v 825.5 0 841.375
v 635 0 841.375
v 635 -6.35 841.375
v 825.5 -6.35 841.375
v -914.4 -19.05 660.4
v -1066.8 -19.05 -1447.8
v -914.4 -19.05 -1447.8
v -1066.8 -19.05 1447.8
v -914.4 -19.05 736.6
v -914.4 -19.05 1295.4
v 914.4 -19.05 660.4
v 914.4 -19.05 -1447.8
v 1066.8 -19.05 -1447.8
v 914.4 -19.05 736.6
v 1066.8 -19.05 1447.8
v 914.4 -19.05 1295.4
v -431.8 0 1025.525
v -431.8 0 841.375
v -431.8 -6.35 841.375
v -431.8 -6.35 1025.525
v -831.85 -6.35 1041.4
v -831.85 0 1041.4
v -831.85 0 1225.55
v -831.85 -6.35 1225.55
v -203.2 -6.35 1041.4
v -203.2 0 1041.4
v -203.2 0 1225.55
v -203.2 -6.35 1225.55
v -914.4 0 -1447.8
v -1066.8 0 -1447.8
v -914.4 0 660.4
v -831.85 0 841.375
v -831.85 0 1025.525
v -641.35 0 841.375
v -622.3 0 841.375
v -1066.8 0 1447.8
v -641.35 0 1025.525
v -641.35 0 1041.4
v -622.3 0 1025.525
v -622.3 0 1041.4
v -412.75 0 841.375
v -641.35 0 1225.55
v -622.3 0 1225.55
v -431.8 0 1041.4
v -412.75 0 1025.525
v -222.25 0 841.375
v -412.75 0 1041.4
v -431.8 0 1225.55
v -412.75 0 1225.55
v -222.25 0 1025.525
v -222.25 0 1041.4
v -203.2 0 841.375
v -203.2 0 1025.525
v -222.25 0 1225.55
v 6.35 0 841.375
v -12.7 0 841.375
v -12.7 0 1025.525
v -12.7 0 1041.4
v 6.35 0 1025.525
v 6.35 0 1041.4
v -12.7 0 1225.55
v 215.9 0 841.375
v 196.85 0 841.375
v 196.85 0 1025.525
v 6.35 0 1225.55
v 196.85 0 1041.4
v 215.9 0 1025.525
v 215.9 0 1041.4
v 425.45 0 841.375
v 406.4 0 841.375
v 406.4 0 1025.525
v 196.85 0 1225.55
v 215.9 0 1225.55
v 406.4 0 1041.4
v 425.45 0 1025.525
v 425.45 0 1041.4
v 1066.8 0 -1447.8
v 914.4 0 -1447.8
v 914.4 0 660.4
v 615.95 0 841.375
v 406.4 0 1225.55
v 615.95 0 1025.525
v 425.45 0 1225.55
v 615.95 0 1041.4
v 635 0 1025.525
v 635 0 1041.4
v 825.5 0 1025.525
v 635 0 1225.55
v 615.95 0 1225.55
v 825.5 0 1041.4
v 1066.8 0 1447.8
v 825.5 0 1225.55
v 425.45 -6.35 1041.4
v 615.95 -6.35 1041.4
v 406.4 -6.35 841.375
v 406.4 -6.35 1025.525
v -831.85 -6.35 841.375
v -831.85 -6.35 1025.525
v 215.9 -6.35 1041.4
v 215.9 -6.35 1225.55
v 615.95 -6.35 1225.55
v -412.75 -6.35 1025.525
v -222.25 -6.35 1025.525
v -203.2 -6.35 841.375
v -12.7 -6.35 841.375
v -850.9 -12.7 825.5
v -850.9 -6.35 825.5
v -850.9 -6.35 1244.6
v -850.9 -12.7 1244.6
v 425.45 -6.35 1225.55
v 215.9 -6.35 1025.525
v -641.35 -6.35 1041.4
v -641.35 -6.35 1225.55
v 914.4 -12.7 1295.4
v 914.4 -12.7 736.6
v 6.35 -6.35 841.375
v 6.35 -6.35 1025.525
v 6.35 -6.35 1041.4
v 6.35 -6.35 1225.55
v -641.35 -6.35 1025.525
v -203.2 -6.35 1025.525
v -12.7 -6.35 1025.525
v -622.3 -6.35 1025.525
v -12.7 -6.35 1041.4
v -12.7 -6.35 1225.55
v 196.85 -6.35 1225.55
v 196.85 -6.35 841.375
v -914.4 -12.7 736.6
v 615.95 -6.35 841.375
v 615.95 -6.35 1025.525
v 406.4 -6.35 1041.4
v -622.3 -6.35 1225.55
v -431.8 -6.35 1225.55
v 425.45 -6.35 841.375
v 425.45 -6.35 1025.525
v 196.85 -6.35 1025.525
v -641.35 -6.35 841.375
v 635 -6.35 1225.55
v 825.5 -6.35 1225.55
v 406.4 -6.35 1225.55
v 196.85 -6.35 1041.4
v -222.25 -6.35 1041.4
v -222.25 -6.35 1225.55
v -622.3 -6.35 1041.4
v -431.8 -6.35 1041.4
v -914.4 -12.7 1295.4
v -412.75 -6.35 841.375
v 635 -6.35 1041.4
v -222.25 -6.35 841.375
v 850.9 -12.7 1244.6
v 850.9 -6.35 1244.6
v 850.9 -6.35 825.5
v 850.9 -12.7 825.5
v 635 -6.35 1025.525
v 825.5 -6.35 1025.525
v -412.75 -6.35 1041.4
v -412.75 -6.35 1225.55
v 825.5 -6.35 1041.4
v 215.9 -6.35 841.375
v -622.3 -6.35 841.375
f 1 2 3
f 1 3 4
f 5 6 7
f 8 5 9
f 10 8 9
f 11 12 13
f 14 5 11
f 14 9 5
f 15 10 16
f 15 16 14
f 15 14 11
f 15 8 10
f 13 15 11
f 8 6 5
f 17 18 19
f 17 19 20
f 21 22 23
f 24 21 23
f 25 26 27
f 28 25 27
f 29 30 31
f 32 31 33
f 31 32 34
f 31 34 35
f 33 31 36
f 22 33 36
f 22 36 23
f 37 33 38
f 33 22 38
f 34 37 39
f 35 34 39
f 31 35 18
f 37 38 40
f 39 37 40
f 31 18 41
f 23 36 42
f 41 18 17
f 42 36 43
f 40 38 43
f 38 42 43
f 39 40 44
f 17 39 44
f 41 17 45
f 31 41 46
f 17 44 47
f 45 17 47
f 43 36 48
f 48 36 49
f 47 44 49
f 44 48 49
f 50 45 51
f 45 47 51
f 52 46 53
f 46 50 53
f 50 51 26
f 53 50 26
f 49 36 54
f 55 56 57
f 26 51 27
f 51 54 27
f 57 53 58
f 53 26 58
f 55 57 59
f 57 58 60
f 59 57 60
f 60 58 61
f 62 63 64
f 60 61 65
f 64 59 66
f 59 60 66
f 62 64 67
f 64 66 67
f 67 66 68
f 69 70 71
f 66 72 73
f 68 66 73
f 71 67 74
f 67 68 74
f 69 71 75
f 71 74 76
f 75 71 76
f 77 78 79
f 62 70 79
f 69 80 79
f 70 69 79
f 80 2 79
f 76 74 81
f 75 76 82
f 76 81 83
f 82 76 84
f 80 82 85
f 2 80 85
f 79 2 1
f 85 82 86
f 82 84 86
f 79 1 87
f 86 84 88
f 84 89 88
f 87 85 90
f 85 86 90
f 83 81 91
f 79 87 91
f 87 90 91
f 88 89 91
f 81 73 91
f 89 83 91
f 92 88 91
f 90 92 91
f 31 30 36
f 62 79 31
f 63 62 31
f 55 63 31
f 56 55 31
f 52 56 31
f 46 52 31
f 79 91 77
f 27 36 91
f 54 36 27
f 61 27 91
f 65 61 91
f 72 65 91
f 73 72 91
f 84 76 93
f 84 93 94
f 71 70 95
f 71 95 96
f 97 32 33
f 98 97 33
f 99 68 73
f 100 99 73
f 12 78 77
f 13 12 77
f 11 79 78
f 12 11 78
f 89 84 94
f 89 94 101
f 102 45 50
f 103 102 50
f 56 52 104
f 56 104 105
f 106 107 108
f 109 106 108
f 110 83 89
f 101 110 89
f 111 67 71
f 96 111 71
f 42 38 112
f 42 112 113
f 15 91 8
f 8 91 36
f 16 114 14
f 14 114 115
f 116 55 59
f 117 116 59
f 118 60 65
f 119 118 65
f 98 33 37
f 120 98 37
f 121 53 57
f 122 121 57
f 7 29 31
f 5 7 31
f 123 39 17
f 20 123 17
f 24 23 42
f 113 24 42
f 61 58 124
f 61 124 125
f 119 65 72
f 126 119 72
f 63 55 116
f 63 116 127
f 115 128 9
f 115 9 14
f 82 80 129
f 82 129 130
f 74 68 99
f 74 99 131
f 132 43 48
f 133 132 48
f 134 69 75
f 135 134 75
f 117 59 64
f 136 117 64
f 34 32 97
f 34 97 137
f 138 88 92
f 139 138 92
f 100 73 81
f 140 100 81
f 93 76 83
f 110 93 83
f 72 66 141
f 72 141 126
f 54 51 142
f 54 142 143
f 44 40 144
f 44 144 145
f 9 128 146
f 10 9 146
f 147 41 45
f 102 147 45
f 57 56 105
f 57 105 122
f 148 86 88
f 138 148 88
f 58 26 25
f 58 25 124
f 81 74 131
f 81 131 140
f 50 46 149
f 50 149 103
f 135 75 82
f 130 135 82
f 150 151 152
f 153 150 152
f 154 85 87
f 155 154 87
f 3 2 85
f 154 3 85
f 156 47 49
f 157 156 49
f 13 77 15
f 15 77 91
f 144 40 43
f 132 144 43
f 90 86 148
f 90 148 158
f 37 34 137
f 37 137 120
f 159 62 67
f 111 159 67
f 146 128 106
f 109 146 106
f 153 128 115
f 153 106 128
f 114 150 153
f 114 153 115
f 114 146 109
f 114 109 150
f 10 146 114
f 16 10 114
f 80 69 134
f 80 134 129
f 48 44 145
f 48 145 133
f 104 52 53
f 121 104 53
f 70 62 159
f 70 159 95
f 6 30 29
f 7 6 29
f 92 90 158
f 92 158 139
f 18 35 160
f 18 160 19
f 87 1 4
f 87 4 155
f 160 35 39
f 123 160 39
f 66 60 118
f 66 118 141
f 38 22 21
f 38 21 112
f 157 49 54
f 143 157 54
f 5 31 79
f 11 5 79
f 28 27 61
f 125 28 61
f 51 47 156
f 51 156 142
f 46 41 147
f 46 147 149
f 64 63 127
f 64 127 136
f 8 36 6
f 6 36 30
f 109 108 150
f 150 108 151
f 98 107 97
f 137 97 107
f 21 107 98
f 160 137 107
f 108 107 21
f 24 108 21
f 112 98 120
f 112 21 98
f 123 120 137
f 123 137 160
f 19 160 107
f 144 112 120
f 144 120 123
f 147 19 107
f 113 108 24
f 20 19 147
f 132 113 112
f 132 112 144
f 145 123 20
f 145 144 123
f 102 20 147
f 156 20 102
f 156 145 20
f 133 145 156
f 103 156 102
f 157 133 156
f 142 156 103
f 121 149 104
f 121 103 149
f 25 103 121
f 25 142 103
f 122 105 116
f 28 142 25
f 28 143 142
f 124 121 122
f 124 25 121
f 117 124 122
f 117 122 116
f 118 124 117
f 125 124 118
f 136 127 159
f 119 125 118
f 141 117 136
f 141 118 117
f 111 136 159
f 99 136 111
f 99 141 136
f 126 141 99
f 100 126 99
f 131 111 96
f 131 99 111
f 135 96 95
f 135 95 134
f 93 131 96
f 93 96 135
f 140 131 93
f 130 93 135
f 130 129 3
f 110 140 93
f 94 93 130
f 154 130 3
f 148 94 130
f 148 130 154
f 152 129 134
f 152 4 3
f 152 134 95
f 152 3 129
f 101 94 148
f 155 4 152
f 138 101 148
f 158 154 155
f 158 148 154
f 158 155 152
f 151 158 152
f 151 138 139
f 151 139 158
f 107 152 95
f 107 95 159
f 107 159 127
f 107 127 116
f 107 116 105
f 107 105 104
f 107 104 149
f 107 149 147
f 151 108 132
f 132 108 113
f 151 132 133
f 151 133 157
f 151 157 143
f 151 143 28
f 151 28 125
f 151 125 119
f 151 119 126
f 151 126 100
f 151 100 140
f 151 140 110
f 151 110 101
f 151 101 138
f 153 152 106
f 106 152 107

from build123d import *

# Parameters (mm, degrees)
F0_W     = 152.4
F0_H     = 152.4
F0_W_2   = 1828.8
F0_H_2   = 76.2
F1_DEPTH = 19.05
F0_H_3   = 558.8
F2_DEPTH = 12.7
F0_W_3   = 190.5
F0_H_4   = 184.15
F3_DEPTH = 6.35


with BuildPart() as f1:
    # F0 (on Front) → F1 (new body)
    with BuildSketch(Plane.XZ):
        Polygon((-914.4, 1295.4), (-1066.8, 1295.4), (-1066.8, -1447.8), (-914.4, -1447.8), (-914.4, 660.4), (-914.4, 736.6), align=None)
        with Locations((-990.6, 1371.6)):
            Rectangle(F0_W, F0_H)
        with Locations((0, 1371.6)):
            Rectangle(F0_W_2, F0_H)
        with Locations((990.6, 1371.6)):
            Rectangle(F0_W, F0_H)
        Polygon((1066.8, 1295.4), (914.4, 1295.4), (914.4, 736.6), (914.4, 660.4), (914.4, -1447.8), (1066.8, -1447.8), align=None)
        with Locations((0, 698.5)):
            Rectangle(F0_W_2, F0_H_2)
    extrude(amount=F1_DEPTH)

    # F0 (on Front) → F2 (join)
    with BuildSketch(Plane.XZ):
        with Locations((0, 1016)):
            Rectangle(F0_W_2, F0_H_3)
        Polygon((-850.9, 1225.55), (-850.9, 1244.6), (-831.85, 1244.6), (-641.35, 1244.6), (-622.3, 1244.6), (850.9, 1244.6), (850.9, 1225.55), (850.9, 1041.4), (850.9, 1025.525), (850.9, 841.375), (850.9, 825.5), (-622.3, 825.5), (-641.35, 825.5), (-831.85, 825.5), (-850.9, 825.5), (-850.9, 841.375), (-850.9, 1025.525), (-850.9, 1041.4), align=None, mode=Mode.SUBTRACT)
    extrude(amount=F2_DEPTH)

    # F0 (on Front) → F3 (join)
    with BuildSketch(Plane.XZ):
        Polygon((-831.85, 1244.6), (-850.9, 1244.6), (-850.9, 1225.55), (-850.9, 1041.4), (-850.9, 1025.525), (-850.9, 841.375), (-850.9, 825.5), (-831.85, 825.5), (-641.35, 825.5), (-622.3, 825.5), (850.9, 825.5), (850.9, 841.375), (850.9, 1025.525), (850.9, 1041.4), (850.9, 1225.55), (850.9, 1244.6), (-622.3, 1244.6), (-641.35, 1244.6), align=None)
        with Locations((-736.6, 933.45)):
            Rectangle(F0_W_3, F0_H_4, mode=Mode.SUBTRACT)
        with Locations((-736.6, 1133.475)):
            Rectangle(F0_W_3, F0_H_4, mode=Mode.SUBTRACT)
        with Locations((-527.05, 933.45)):
            Rectangle(F0_W_3, F0_H_4, mode=Mode.SUBTRACT)
        with Locations((-317.5, 933.45)):
            Rectangle(F0_W_3, F0_H_4, mode=Mode.SUBTRACT)
        with Locations((-107.95, 933.45)):
            Rectangle(F0_W_3, F0_H_4, mode=Mode.SUBTRACT)
        with Locations((-527.05, 1133.475)):
            Rectangle(F0_W_3, F0_H_4, mode=Mode.SUBTRACT)
        with Locations((-317.5, 1133.475)):
            Rectangle(F0_W_3, F0_H_4, mode=Mode.SUBTRACT)
        with Locations((-107.95, 1133.475)):
            Rectangle(F0_W_3, F0_H_4, mode=Mode.SUBTRACT)
        with Locations((101.6, 933.45)):
            Rectangle(F0_W_3, F0_H_4, mode=Mode.SUBTRACT)
        with Locations((311.15, 933.45)):
            Rectangle(F0_W_3, F0_H_4, mode=Mode.SUBTRACT)
        with Locations((520.7, 933.45)):
            Rectangle(F0_W_3, F0_H_4, mode=Mode.SUBTRACT)
        with Locations((101.6, 1133.475)):
            Rectangle(F0_W_3, F0_H_4, mode=Mode.SUBTRACT)
        with Locations((311.15, 1133.475)):
            Rectangle(F0_W_3, F0_H_4, mode=Mode.SUBTRACT)
        with Locations((520.7, 1133.475)):
            Rectangle(F0_W_3, F0_H_4, mode=Mode.SUBTRACT)
        with Locations((730.25, 933.45)):
            Rectangle(F0_W_3, F0_H_4, mode=Mode.SUBTRACT)
        with Locations((730.25, 1133.475)):
            Rectangle(F0_W_3, F0_H_4, mode=Mode.SUBTRACT)
    extrude(amount=F3_DEPTH)


solid = f1.part
